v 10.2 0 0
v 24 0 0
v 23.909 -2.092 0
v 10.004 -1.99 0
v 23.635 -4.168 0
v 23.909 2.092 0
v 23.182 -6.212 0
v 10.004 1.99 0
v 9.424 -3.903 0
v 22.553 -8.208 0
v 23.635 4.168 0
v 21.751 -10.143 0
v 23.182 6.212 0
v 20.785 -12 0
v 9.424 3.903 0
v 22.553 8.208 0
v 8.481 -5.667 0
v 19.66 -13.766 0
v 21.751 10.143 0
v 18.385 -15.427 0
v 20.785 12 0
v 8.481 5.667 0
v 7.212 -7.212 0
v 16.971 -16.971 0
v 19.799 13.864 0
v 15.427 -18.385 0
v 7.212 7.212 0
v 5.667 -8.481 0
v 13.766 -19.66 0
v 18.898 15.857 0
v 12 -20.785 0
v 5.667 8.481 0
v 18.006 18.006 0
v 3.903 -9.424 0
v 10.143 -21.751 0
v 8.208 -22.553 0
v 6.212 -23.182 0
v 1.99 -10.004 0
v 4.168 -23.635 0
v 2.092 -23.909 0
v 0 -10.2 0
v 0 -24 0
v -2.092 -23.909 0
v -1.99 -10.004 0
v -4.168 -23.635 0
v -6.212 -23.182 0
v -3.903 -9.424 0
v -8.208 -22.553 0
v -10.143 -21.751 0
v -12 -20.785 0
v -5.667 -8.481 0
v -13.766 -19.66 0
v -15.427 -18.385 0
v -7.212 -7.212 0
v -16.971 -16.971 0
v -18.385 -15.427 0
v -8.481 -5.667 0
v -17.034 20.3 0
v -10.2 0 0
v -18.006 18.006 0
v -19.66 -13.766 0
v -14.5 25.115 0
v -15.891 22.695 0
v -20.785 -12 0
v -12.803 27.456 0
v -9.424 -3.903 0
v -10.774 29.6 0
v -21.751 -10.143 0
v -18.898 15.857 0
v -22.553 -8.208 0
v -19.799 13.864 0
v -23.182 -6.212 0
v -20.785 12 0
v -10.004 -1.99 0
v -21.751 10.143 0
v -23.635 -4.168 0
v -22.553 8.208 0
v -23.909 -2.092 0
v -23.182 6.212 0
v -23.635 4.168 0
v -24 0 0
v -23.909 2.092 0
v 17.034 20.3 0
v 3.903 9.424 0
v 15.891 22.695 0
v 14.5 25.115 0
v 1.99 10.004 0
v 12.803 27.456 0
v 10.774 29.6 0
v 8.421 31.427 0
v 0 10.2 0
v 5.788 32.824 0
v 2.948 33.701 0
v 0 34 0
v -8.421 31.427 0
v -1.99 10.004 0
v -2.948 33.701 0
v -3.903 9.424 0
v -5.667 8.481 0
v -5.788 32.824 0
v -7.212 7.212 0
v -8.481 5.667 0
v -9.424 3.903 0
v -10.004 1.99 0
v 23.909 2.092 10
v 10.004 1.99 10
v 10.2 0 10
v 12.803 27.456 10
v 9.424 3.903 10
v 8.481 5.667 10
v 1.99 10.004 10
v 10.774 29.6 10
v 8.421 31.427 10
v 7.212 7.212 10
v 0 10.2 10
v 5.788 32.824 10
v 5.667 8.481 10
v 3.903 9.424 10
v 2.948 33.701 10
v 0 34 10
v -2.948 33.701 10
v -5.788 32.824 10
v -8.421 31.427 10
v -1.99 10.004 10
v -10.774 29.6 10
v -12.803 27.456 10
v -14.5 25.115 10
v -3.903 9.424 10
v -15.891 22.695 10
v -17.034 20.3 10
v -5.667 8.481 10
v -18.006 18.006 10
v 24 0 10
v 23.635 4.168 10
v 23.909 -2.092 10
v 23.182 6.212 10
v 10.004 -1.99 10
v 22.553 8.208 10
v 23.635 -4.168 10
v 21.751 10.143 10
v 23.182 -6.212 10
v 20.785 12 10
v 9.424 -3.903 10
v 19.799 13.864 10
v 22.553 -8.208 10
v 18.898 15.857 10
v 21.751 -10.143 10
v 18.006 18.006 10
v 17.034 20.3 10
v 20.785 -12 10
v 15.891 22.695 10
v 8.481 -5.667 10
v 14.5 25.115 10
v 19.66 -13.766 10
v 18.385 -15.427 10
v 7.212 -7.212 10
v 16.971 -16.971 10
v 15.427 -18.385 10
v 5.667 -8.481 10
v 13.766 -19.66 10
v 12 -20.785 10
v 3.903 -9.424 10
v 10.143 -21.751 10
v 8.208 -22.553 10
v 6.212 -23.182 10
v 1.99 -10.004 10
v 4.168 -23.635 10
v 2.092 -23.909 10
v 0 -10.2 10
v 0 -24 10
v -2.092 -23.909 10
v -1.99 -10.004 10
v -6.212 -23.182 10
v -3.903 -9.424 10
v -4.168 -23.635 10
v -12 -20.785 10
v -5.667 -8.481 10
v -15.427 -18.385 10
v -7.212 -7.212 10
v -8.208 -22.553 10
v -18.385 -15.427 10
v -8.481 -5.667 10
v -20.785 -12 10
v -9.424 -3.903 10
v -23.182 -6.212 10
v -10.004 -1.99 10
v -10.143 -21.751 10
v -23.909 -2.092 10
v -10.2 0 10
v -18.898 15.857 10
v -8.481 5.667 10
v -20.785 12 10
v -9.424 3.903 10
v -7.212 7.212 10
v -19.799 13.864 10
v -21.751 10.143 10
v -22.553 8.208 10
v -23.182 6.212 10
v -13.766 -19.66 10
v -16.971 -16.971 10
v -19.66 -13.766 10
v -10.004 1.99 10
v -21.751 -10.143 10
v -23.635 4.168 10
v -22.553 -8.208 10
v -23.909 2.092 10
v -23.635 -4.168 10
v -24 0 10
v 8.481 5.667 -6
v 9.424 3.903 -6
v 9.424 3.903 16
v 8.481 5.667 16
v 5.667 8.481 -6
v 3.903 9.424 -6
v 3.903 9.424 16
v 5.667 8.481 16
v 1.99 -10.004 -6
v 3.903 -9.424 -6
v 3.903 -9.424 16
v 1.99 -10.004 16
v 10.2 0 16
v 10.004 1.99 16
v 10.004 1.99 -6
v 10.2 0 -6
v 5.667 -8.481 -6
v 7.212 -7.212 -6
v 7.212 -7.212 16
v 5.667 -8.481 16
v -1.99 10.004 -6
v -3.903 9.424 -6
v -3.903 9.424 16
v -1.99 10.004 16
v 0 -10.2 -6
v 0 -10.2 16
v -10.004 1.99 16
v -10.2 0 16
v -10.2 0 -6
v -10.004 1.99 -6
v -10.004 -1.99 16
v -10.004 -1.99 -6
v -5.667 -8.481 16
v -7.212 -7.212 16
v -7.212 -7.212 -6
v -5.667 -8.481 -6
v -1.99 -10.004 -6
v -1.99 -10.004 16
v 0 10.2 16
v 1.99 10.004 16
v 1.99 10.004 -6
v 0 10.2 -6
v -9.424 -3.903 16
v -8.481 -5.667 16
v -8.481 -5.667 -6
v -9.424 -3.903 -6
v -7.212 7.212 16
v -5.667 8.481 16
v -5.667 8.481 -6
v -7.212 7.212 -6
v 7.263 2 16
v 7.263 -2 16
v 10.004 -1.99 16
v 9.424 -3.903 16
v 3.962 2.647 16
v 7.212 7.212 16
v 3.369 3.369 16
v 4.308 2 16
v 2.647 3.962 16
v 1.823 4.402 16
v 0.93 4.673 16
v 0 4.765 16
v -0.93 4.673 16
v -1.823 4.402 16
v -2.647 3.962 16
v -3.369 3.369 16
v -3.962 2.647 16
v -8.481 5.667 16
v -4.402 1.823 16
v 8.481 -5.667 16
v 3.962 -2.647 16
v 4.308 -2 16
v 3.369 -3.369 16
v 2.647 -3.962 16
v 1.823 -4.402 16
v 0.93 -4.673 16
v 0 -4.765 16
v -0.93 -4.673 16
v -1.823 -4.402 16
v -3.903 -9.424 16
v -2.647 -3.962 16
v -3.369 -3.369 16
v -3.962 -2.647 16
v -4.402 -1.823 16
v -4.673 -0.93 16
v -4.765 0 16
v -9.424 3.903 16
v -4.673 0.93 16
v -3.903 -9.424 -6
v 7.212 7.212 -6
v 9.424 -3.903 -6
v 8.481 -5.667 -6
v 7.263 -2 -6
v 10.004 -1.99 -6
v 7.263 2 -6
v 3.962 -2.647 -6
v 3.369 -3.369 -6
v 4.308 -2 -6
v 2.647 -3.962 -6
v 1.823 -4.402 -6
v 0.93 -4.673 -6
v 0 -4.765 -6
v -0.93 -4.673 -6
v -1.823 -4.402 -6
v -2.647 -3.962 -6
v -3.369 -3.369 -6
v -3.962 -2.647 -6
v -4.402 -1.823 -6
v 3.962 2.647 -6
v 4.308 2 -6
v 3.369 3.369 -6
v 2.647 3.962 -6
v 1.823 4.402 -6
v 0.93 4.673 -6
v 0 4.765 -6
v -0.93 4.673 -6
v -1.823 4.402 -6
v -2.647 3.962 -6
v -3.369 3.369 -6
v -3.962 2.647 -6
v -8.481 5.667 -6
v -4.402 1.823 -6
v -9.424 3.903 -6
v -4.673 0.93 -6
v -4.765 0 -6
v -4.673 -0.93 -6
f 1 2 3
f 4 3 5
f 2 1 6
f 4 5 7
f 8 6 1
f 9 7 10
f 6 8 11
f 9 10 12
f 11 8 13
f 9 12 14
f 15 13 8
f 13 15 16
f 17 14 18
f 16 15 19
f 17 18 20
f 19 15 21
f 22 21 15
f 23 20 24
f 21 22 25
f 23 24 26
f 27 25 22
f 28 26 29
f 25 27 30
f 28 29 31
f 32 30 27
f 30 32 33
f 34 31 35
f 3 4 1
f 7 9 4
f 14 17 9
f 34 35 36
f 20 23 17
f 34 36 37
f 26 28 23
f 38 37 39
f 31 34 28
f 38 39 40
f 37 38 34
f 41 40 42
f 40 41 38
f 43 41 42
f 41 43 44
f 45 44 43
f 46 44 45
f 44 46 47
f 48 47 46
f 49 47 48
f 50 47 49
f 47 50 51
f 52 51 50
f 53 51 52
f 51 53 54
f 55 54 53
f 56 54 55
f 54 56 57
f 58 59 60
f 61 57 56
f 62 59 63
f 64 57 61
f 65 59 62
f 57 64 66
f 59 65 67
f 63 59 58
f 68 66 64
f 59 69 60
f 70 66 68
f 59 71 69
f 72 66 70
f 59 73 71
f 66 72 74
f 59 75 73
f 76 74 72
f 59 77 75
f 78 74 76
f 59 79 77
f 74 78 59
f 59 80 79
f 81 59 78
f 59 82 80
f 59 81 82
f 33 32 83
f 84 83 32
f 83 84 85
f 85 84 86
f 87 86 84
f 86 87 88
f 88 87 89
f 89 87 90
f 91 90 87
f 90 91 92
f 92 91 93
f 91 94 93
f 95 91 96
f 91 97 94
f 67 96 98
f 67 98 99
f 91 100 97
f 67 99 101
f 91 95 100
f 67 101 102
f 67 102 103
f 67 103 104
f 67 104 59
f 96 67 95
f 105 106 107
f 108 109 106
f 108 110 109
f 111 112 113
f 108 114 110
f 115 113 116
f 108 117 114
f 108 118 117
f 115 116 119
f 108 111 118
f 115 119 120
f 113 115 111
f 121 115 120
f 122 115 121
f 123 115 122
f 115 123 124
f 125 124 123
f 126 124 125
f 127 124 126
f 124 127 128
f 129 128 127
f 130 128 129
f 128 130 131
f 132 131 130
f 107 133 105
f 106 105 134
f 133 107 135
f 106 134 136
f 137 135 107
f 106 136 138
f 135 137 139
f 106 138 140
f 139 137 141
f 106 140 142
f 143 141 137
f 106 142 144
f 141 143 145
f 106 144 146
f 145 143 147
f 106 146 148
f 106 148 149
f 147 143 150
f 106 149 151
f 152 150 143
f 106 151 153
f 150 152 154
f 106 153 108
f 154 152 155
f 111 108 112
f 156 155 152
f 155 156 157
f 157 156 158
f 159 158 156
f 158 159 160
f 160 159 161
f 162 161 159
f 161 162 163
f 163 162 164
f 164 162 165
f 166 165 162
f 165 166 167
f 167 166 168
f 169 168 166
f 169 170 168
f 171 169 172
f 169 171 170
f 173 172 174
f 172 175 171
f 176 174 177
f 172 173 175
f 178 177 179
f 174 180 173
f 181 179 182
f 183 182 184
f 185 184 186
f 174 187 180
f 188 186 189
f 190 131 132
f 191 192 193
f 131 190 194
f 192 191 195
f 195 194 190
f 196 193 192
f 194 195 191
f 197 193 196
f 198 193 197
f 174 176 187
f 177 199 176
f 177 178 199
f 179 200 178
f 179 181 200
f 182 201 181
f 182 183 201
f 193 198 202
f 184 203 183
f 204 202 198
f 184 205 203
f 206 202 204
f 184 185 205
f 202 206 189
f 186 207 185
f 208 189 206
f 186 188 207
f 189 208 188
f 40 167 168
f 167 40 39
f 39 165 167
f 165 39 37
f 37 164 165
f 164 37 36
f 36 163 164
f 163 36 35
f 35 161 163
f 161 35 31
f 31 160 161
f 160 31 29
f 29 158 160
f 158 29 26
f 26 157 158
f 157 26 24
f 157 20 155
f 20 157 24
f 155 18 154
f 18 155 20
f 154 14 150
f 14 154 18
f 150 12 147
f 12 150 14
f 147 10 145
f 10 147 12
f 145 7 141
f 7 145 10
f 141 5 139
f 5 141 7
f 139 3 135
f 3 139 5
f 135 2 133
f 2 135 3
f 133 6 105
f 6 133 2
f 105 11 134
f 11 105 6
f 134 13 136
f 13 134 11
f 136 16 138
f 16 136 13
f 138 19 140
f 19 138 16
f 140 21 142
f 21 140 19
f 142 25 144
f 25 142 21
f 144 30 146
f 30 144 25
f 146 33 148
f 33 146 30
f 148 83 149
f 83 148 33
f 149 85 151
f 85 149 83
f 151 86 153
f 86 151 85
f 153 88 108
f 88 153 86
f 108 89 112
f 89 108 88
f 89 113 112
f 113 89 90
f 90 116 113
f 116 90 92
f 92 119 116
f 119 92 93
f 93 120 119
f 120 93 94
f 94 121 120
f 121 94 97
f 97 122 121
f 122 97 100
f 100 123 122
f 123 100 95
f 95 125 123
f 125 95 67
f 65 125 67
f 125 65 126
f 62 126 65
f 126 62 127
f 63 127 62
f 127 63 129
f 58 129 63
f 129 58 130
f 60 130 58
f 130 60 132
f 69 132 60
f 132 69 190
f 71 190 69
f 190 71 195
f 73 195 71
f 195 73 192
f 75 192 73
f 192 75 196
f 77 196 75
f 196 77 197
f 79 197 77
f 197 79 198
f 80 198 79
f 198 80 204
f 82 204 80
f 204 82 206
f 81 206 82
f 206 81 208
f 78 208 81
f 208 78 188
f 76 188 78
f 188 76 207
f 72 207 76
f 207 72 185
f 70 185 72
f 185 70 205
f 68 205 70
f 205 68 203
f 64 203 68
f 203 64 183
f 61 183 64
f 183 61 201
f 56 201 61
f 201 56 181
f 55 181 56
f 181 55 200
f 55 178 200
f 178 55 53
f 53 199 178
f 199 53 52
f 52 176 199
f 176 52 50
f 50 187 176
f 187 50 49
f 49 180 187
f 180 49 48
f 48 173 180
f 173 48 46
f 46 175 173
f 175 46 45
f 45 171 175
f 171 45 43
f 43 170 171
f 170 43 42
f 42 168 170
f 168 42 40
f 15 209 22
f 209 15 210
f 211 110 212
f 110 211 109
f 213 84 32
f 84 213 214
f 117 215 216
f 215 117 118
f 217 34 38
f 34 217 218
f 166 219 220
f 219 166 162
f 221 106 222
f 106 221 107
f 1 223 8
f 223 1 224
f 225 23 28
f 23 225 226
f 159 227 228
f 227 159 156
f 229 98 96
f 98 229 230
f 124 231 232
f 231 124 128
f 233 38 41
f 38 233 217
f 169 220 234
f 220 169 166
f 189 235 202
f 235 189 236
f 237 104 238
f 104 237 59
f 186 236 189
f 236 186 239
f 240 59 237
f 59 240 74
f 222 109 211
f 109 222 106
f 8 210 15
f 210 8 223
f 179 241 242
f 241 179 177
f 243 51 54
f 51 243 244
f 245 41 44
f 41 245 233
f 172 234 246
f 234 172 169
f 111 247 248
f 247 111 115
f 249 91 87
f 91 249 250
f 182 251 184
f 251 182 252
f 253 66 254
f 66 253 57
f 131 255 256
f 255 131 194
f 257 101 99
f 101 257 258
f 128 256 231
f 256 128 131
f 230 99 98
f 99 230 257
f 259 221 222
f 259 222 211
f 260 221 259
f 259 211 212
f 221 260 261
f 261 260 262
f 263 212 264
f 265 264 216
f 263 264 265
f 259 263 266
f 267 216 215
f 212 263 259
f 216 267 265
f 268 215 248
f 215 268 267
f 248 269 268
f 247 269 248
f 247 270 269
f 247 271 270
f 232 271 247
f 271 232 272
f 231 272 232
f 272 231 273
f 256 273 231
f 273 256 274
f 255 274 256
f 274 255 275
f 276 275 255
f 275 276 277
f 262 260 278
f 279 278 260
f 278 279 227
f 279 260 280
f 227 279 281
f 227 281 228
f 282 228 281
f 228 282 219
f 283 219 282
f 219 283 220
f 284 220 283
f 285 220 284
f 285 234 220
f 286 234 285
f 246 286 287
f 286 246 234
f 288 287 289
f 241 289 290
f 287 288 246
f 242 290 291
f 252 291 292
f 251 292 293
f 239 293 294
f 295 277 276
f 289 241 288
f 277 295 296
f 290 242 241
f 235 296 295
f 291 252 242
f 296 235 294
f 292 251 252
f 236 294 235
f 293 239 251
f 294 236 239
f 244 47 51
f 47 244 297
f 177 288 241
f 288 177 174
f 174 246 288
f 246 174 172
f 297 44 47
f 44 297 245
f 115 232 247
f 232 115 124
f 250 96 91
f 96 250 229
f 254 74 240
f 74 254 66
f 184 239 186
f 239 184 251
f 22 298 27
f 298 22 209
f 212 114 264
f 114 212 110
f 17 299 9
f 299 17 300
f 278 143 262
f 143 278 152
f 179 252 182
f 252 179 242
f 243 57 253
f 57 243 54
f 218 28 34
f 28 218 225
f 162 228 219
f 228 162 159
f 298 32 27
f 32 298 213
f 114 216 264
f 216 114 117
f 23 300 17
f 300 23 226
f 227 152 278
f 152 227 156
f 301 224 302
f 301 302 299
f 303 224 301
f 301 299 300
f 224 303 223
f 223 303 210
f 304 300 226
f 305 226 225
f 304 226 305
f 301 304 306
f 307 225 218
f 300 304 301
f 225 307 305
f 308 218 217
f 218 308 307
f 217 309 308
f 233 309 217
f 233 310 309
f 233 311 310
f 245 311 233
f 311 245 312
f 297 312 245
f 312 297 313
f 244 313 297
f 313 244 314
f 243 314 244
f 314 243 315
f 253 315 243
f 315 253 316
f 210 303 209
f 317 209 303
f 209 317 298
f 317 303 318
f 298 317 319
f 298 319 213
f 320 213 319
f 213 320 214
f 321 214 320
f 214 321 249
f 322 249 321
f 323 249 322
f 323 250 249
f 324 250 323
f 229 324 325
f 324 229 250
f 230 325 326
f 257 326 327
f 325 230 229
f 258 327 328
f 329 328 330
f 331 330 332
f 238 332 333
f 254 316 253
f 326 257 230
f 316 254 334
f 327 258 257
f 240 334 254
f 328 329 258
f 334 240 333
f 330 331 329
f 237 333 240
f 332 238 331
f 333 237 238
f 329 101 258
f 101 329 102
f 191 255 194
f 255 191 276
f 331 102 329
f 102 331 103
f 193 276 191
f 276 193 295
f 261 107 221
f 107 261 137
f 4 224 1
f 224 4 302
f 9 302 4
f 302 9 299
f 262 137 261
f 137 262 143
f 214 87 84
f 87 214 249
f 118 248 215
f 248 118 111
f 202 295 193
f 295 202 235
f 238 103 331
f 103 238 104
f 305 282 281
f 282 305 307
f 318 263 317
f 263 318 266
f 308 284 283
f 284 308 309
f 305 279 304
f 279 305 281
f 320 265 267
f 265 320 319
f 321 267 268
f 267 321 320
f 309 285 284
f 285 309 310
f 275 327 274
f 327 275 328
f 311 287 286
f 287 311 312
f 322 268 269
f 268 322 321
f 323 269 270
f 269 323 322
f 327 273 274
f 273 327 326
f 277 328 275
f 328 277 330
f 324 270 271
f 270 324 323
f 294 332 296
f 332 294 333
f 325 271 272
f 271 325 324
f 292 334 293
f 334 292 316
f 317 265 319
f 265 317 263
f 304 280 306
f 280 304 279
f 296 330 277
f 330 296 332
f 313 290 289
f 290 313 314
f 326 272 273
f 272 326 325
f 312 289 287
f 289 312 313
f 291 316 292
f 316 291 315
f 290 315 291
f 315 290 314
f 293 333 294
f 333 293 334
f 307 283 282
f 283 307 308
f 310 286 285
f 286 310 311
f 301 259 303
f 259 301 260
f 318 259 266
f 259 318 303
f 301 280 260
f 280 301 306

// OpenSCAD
$fn = 32;

// ----------------------------------------------------------------------
// Cam: base radius 24 mm with a 10 mm lift over 120 degrees
// ----------------------------------------------------------------------

// --- parameters (mm) ---
base_r = 24;              // base radius
lift = 10;                // lift height above the base radius
lift_span = 120;          // angular width of the lift
lift_start = 30;          // angle where the lift starts
cam_t = 10;               // cam plate thickness
hub_d = 20.4;             // hub diameter
hub_h = 22;               // hub height
bore_d = 9.53;            // bore
key_w = 4;                // keyway width
key_depth = 2;            // keyway depth

cam_profile = [[24, 0], [23.909, 2.092], [23.635, 4.168], [23.182, 6.212], [22.553, 8.208], [21.751, 10.143], [20.785, 12], [19.799, 13.864], [18.898, 15.857], [18.006, 18.006], [17.034, 20.3], [15.891, 22.695], [14.5, 25.115], [12.803, 27.456], [10.774, 29.6], [8.421, 31.427], [5.788, 32.824], [2.948, 33.701], [0, 34], [-2.948, 33.701], [-5.788, 32.824], [-8.421, 31.427], [-10.774, 29.6], [-12.803, 27.456], [-14.5, 25.115], [-15.891, 22.695], [-17.034, 20.3], [-18.006, 18.006], [-18.898, 15.857], [-19.799, 13.864], [-20.785, 12], [-21.751, 10.143], [-22.553, 8.208], [-23.182, 6.212], [-23.635, 4.168], [-23.909, 2.092], [-24, 0], [-23.909, -2.092], [-23.635, -4.168], [-23.182, -6.212], [-22.553, -8.208], [-21.751, -10.143], [-20.785, -12], [-19.66, -13.766], [-18.385, -15.427], [-16.971, -16.971], [-15.427, -18.385], [-13.766, -19.66], [-12, -20.785], [-10.143, -21.751], [-8.208, -22.553], [-6.212, -23.182], [-4.168, -23.635], [-2.092, -23.909], [0, -24], [2.092, -23.909], [4.168, -23.635], [6.212, -23.182], [8.208, -22.553], [10.143, -21.751], [12, -20.785], [13.766, -19.66], [15.427, -18.385], [16.971, -16.971], [18.385, -15.427], [19.66, -13.766], [20.785, -12], [21.751, -10.143], [22.553, -8.208], [23.182, -6.212], [23.635, -4.168], [23.909, -2.092]];

difference() {
  union() {
    linear_extrude(height = cam_t) polygon(cam_profile);
    /* hub, proud of the cam plate on both sides */
    translate([0, 0, -6]) cylinder(h = hub_h, d = hub_d);
  }
  /* bore through the hub, 2.5 mm clear on both faces */
  translate([0, 0, -8.5]) cylinder(h = hub_h + 5, d = bore_d);
  /* keyway, milled through the whole hub */
  translate([2.763, -2, -8.5]) cube([4.5, 4, 27]);
}
